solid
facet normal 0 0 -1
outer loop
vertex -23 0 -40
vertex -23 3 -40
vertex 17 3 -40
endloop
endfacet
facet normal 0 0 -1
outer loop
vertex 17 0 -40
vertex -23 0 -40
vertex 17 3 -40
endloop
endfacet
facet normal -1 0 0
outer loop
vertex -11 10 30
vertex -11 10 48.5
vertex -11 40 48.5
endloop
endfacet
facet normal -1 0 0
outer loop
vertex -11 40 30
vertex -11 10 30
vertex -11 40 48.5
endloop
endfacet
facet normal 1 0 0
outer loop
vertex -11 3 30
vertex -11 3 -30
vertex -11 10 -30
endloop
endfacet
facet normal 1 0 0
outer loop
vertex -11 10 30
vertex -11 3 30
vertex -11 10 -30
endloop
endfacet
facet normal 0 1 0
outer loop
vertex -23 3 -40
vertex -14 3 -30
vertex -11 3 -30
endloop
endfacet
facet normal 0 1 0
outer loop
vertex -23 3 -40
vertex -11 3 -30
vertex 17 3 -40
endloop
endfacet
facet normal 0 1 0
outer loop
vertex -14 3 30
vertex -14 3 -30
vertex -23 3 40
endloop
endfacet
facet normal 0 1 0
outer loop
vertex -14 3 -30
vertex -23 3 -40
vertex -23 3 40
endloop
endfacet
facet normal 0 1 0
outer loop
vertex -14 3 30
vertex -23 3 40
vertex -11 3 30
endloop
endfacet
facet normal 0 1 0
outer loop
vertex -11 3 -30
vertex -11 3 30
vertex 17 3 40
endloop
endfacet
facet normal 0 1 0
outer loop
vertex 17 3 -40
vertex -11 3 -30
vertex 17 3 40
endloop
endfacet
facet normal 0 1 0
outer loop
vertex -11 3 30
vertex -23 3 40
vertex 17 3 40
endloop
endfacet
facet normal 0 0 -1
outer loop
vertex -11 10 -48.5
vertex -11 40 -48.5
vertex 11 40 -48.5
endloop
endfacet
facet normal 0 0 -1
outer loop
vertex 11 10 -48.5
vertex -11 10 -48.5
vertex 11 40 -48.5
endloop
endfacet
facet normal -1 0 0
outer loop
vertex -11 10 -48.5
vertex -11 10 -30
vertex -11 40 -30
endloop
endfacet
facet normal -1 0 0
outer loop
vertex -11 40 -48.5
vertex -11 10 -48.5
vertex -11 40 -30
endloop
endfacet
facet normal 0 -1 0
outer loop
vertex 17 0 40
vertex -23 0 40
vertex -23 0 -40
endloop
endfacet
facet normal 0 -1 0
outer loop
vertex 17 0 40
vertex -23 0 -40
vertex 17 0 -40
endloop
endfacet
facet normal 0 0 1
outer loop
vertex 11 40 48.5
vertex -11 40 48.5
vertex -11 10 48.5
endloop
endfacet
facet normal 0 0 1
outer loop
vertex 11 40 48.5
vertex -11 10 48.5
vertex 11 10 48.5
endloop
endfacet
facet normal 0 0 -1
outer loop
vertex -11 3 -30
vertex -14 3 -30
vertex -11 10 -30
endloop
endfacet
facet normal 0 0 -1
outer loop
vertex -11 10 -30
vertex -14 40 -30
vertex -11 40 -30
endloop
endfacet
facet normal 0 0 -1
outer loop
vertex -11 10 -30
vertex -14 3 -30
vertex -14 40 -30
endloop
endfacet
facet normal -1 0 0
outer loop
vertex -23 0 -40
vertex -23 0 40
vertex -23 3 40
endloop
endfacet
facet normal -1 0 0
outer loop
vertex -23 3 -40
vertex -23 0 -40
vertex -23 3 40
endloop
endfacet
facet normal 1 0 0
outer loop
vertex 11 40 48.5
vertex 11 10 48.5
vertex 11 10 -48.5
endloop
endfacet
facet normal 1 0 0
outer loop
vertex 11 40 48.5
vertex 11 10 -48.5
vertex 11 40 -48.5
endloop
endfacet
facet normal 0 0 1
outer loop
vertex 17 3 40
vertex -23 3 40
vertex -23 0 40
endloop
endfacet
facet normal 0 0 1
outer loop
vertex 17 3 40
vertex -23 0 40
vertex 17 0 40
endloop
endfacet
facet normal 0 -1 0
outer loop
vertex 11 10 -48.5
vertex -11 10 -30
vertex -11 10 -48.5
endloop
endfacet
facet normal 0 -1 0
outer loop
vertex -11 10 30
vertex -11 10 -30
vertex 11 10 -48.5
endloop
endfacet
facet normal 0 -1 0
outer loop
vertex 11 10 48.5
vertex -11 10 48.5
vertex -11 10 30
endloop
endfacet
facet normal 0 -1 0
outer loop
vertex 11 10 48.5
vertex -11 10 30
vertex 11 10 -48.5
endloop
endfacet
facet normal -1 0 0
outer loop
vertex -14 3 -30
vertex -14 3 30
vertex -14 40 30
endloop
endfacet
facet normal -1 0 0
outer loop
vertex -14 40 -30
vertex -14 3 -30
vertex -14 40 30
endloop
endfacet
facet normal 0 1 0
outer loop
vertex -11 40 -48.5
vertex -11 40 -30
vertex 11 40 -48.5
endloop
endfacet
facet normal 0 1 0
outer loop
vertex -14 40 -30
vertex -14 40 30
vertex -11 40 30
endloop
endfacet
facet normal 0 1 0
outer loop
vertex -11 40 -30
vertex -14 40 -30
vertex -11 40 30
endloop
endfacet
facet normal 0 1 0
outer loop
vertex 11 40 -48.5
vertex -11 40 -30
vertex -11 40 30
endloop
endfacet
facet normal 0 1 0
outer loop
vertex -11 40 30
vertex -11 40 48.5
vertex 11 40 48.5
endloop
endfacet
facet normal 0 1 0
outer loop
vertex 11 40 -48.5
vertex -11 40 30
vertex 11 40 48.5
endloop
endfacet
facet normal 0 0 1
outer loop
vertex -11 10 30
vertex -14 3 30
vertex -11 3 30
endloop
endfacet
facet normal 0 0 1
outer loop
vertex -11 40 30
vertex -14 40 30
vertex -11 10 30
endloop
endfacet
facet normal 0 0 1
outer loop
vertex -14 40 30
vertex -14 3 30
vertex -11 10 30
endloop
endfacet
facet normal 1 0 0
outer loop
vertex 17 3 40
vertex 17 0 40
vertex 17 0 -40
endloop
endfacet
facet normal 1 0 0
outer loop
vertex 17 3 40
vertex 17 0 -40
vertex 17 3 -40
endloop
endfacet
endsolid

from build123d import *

# Parameters (mm, degrees)
SK_BRACKET_BASE_W     = 40
SK_BRACKET_BASE_H     = 3
BRACKET_BASE_DEPTH    = 40
SK_BRACKET_UPRIGHT_W  = 3
SK_BRACKET_UPRIGHT_H  = 40
BRACKET_UPRIGHT_DEPTH = 30
SK_CAMERA_W           = 22
SK_CAMERA_H           = 30
CAMERA_DEPTH          = 48.5


with BuildPart() as part:
    # SK_Bracket_Base → Bracket_Base (new, symmetric)
    with BuildSketch(Plane.XY):
        with Locations((-3, 1.5)):
            Rectangle(SK_BRACKET_BASE_W, SK_BRACKET_BASE_H)
    extrude(amount=BRACKET_BASE_DEPTH, both=True)

    # SK_Bracket_Upright → Bracket_Upright (add, symmetric)
    with BuildSketch(Plane.XY):
        with Locations((-12.5, 20)):
            Rectangle(SK_BRACKET_UPRIGHT_W, SK_BRACKET_UPRIGHT_H)
    extrude(amount=BRACKET_UPRIGHT_DEPTH, both=True)

    # SK_Camera → Camera (add, symmetric)
    with BuildSketch(Plane.XY):
        with Locations((0, 25)):
            Rectangle(SK_CAMERA_W, SK_CAMERA_H)
    extrude(amount=CAMERA_DEPTH, both=True)


solid = part.part
